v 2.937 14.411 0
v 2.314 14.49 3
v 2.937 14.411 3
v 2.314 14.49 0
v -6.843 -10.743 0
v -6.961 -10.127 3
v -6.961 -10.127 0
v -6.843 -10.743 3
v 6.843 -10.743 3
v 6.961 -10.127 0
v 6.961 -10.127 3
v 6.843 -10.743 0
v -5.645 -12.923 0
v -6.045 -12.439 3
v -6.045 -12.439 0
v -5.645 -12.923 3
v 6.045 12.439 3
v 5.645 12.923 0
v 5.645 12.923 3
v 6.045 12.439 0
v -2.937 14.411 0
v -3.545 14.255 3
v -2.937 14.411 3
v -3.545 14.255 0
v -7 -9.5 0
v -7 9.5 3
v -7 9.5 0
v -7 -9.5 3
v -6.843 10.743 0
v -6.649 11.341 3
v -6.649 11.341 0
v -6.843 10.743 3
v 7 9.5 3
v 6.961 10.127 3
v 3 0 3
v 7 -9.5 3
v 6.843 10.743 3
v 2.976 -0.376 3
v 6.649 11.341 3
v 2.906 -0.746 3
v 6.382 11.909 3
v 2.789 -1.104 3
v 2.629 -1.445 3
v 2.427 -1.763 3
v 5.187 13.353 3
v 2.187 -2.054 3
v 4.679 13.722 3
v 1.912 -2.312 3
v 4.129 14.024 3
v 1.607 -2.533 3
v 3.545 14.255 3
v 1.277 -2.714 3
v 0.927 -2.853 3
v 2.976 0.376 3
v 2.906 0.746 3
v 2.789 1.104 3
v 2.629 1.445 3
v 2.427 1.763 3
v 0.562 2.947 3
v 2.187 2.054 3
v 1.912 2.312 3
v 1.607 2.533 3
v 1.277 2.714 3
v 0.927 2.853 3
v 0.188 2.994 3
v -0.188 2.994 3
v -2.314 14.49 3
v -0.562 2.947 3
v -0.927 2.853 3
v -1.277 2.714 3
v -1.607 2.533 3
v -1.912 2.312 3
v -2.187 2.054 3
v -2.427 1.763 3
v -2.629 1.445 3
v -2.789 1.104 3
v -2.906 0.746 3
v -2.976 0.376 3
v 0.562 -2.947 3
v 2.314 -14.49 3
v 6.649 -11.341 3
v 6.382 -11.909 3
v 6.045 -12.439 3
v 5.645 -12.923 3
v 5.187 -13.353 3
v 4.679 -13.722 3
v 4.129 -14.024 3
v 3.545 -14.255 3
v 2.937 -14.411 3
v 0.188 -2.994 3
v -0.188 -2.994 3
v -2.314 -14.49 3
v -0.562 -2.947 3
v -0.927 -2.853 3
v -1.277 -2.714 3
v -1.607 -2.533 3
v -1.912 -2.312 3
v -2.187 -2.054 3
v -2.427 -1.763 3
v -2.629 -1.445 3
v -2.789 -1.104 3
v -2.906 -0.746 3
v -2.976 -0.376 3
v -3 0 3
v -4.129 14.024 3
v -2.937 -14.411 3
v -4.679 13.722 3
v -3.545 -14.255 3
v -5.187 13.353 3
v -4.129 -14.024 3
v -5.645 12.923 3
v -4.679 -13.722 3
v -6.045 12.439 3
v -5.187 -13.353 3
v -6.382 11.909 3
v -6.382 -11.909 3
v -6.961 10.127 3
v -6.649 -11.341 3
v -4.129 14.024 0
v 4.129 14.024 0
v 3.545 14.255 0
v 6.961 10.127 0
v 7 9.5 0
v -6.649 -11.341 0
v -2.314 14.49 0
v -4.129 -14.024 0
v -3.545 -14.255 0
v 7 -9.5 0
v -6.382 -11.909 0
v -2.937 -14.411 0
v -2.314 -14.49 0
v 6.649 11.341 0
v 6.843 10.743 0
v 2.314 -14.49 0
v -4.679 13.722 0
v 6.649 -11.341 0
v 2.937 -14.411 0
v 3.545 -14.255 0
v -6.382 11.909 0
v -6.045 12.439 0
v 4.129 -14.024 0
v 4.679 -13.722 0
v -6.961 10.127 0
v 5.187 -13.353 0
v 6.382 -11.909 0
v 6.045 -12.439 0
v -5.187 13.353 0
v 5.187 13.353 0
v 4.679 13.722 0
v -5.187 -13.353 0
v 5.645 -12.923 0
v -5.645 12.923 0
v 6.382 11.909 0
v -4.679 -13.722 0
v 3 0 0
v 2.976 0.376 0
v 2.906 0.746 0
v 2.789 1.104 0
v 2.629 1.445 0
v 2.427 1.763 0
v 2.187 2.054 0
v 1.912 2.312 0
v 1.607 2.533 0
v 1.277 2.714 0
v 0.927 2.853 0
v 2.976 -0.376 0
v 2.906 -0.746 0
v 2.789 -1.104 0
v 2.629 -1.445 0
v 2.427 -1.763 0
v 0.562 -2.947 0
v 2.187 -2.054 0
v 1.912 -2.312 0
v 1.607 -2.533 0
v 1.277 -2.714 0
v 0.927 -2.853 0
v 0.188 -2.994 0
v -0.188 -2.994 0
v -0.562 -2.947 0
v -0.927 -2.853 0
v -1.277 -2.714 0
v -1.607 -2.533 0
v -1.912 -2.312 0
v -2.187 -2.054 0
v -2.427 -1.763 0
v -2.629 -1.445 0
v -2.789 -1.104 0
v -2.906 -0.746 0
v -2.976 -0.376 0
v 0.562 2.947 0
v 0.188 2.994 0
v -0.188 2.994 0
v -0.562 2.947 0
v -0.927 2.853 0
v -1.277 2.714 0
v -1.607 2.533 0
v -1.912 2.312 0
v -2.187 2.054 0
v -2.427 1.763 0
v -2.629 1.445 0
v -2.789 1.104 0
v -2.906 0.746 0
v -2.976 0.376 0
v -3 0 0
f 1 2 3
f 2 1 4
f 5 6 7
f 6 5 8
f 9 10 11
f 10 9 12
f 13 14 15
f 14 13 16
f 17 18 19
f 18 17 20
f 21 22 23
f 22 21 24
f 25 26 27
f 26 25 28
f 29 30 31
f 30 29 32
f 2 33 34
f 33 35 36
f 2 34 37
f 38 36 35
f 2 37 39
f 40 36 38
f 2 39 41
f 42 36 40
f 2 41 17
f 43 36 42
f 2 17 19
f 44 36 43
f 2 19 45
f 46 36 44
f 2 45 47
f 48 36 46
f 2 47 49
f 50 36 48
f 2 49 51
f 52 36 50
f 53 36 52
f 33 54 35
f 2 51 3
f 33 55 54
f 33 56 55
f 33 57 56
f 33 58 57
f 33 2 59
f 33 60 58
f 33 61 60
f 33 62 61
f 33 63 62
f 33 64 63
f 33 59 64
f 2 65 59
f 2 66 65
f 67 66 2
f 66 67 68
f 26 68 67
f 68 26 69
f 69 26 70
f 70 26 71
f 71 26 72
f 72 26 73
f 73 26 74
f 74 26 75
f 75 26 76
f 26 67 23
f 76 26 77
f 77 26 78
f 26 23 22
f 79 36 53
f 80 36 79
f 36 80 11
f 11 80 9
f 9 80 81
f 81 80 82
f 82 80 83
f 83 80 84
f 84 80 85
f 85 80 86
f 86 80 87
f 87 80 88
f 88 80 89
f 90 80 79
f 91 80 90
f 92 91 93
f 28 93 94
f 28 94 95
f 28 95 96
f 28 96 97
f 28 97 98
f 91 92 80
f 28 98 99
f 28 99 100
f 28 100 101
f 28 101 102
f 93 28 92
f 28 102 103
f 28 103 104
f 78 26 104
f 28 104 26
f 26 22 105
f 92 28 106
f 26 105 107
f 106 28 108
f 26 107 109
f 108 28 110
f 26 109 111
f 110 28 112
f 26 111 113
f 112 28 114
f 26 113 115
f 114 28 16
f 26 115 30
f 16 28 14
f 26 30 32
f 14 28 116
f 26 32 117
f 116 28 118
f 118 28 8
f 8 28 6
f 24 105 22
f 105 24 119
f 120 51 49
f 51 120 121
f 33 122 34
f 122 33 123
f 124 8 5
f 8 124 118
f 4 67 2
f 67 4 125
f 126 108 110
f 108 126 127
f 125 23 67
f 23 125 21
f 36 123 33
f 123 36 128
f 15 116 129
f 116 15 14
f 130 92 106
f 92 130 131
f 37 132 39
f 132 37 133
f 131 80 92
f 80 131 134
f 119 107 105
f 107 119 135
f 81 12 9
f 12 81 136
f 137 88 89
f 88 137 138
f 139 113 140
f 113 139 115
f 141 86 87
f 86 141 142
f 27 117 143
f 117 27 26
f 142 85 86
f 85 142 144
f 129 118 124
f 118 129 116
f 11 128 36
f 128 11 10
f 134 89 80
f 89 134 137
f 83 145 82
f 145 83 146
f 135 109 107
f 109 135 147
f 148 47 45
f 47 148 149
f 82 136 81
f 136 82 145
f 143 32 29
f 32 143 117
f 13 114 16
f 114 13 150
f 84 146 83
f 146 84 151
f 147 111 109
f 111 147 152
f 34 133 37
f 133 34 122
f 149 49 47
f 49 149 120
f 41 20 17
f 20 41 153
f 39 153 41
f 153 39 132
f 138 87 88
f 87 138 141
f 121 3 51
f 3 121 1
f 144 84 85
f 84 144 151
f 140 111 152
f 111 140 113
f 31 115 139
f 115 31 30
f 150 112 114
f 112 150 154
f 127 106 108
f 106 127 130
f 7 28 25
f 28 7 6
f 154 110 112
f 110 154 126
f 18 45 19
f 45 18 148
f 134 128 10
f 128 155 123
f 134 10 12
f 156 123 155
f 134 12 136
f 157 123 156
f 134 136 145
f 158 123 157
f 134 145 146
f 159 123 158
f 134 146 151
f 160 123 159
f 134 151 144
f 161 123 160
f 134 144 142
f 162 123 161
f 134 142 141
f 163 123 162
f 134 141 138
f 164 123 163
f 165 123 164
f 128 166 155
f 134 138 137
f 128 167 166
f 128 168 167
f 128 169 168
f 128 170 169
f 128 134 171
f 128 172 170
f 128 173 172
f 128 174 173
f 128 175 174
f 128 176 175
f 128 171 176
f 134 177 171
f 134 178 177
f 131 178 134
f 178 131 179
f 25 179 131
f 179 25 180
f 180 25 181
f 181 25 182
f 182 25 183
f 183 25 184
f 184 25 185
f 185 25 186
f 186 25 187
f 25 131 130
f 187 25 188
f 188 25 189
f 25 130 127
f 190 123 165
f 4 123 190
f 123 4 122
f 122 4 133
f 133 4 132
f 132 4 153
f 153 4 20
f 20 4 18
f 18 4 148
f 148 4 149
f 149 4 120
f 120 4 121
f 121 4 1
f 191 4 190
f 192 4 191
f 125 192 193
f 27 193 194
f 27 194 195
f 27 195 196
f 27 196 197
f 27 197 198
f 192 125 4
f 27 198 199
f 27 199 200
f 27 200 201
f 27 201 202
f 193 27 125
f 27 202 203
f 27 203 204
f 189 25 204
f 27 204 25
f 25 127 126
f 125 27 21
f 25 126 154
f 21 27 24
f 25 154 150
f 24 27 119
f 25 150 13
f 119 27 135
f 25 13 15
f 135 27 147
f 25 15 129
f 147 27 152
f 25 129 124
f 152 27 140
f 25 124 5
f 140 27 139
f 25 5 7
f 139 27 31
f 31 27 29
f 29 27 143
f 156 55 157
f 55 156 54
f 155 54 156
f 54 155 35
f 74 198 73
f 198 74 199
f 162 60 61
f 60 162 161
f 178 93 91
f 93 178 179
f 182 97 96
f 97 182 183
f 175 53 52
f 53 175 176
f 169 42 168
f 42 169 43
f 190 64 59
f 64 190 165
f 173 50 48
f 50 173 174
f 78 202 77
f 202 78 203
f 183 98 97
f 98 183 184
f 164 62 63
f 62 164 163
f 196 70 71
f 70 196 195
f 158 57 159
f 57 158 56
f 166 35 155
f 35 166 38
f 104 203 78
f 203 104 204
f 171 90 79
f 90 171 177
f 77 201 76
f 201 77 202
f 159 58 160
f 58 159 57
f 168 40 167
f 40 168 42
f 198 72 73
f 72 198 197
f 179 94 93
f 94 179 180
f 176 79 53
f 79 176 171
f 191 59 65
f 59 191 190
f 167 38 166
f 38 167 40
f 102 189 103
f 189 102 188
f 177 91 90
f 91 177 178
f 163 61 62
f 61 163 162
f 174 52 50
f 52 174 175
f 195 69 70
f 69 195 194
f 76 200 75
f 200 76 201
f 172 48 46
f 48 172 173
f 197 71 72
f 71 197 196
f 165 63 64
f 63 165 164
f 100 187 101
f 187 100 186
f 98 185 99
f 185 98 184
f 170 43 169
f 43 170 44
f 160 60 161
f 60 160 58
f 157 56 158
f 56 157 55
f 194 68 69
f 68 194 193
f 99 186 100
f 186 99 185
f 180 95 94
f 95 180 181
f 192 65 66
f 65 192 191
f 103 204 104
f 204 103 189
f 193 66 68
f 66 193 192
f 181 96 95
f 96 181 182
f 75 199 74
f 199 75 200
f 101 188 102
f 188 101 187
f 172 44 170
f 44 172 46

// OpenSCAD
$fn = 50;

difference() {
	union() {
		hull() {
			translate(v = [-2.0, 9.5, 0]) {
				cylinder(h = 3, r = 5);
			}
			translate(v = [2.0, 9.5, 0]) {
				cylinder(h = 3, r = 5);
			}
			translate(v = [-2.0, -9.5, 0]) {
				cylinder(h = 3, r = 5);
			}
			translate(v = [2.0, -9.5, 0]) {
				cylinder(h = 3, r = 5);
			}
		}
	}
	union() {
		cylinder(h = 3, r = 3.0);
	}
}
